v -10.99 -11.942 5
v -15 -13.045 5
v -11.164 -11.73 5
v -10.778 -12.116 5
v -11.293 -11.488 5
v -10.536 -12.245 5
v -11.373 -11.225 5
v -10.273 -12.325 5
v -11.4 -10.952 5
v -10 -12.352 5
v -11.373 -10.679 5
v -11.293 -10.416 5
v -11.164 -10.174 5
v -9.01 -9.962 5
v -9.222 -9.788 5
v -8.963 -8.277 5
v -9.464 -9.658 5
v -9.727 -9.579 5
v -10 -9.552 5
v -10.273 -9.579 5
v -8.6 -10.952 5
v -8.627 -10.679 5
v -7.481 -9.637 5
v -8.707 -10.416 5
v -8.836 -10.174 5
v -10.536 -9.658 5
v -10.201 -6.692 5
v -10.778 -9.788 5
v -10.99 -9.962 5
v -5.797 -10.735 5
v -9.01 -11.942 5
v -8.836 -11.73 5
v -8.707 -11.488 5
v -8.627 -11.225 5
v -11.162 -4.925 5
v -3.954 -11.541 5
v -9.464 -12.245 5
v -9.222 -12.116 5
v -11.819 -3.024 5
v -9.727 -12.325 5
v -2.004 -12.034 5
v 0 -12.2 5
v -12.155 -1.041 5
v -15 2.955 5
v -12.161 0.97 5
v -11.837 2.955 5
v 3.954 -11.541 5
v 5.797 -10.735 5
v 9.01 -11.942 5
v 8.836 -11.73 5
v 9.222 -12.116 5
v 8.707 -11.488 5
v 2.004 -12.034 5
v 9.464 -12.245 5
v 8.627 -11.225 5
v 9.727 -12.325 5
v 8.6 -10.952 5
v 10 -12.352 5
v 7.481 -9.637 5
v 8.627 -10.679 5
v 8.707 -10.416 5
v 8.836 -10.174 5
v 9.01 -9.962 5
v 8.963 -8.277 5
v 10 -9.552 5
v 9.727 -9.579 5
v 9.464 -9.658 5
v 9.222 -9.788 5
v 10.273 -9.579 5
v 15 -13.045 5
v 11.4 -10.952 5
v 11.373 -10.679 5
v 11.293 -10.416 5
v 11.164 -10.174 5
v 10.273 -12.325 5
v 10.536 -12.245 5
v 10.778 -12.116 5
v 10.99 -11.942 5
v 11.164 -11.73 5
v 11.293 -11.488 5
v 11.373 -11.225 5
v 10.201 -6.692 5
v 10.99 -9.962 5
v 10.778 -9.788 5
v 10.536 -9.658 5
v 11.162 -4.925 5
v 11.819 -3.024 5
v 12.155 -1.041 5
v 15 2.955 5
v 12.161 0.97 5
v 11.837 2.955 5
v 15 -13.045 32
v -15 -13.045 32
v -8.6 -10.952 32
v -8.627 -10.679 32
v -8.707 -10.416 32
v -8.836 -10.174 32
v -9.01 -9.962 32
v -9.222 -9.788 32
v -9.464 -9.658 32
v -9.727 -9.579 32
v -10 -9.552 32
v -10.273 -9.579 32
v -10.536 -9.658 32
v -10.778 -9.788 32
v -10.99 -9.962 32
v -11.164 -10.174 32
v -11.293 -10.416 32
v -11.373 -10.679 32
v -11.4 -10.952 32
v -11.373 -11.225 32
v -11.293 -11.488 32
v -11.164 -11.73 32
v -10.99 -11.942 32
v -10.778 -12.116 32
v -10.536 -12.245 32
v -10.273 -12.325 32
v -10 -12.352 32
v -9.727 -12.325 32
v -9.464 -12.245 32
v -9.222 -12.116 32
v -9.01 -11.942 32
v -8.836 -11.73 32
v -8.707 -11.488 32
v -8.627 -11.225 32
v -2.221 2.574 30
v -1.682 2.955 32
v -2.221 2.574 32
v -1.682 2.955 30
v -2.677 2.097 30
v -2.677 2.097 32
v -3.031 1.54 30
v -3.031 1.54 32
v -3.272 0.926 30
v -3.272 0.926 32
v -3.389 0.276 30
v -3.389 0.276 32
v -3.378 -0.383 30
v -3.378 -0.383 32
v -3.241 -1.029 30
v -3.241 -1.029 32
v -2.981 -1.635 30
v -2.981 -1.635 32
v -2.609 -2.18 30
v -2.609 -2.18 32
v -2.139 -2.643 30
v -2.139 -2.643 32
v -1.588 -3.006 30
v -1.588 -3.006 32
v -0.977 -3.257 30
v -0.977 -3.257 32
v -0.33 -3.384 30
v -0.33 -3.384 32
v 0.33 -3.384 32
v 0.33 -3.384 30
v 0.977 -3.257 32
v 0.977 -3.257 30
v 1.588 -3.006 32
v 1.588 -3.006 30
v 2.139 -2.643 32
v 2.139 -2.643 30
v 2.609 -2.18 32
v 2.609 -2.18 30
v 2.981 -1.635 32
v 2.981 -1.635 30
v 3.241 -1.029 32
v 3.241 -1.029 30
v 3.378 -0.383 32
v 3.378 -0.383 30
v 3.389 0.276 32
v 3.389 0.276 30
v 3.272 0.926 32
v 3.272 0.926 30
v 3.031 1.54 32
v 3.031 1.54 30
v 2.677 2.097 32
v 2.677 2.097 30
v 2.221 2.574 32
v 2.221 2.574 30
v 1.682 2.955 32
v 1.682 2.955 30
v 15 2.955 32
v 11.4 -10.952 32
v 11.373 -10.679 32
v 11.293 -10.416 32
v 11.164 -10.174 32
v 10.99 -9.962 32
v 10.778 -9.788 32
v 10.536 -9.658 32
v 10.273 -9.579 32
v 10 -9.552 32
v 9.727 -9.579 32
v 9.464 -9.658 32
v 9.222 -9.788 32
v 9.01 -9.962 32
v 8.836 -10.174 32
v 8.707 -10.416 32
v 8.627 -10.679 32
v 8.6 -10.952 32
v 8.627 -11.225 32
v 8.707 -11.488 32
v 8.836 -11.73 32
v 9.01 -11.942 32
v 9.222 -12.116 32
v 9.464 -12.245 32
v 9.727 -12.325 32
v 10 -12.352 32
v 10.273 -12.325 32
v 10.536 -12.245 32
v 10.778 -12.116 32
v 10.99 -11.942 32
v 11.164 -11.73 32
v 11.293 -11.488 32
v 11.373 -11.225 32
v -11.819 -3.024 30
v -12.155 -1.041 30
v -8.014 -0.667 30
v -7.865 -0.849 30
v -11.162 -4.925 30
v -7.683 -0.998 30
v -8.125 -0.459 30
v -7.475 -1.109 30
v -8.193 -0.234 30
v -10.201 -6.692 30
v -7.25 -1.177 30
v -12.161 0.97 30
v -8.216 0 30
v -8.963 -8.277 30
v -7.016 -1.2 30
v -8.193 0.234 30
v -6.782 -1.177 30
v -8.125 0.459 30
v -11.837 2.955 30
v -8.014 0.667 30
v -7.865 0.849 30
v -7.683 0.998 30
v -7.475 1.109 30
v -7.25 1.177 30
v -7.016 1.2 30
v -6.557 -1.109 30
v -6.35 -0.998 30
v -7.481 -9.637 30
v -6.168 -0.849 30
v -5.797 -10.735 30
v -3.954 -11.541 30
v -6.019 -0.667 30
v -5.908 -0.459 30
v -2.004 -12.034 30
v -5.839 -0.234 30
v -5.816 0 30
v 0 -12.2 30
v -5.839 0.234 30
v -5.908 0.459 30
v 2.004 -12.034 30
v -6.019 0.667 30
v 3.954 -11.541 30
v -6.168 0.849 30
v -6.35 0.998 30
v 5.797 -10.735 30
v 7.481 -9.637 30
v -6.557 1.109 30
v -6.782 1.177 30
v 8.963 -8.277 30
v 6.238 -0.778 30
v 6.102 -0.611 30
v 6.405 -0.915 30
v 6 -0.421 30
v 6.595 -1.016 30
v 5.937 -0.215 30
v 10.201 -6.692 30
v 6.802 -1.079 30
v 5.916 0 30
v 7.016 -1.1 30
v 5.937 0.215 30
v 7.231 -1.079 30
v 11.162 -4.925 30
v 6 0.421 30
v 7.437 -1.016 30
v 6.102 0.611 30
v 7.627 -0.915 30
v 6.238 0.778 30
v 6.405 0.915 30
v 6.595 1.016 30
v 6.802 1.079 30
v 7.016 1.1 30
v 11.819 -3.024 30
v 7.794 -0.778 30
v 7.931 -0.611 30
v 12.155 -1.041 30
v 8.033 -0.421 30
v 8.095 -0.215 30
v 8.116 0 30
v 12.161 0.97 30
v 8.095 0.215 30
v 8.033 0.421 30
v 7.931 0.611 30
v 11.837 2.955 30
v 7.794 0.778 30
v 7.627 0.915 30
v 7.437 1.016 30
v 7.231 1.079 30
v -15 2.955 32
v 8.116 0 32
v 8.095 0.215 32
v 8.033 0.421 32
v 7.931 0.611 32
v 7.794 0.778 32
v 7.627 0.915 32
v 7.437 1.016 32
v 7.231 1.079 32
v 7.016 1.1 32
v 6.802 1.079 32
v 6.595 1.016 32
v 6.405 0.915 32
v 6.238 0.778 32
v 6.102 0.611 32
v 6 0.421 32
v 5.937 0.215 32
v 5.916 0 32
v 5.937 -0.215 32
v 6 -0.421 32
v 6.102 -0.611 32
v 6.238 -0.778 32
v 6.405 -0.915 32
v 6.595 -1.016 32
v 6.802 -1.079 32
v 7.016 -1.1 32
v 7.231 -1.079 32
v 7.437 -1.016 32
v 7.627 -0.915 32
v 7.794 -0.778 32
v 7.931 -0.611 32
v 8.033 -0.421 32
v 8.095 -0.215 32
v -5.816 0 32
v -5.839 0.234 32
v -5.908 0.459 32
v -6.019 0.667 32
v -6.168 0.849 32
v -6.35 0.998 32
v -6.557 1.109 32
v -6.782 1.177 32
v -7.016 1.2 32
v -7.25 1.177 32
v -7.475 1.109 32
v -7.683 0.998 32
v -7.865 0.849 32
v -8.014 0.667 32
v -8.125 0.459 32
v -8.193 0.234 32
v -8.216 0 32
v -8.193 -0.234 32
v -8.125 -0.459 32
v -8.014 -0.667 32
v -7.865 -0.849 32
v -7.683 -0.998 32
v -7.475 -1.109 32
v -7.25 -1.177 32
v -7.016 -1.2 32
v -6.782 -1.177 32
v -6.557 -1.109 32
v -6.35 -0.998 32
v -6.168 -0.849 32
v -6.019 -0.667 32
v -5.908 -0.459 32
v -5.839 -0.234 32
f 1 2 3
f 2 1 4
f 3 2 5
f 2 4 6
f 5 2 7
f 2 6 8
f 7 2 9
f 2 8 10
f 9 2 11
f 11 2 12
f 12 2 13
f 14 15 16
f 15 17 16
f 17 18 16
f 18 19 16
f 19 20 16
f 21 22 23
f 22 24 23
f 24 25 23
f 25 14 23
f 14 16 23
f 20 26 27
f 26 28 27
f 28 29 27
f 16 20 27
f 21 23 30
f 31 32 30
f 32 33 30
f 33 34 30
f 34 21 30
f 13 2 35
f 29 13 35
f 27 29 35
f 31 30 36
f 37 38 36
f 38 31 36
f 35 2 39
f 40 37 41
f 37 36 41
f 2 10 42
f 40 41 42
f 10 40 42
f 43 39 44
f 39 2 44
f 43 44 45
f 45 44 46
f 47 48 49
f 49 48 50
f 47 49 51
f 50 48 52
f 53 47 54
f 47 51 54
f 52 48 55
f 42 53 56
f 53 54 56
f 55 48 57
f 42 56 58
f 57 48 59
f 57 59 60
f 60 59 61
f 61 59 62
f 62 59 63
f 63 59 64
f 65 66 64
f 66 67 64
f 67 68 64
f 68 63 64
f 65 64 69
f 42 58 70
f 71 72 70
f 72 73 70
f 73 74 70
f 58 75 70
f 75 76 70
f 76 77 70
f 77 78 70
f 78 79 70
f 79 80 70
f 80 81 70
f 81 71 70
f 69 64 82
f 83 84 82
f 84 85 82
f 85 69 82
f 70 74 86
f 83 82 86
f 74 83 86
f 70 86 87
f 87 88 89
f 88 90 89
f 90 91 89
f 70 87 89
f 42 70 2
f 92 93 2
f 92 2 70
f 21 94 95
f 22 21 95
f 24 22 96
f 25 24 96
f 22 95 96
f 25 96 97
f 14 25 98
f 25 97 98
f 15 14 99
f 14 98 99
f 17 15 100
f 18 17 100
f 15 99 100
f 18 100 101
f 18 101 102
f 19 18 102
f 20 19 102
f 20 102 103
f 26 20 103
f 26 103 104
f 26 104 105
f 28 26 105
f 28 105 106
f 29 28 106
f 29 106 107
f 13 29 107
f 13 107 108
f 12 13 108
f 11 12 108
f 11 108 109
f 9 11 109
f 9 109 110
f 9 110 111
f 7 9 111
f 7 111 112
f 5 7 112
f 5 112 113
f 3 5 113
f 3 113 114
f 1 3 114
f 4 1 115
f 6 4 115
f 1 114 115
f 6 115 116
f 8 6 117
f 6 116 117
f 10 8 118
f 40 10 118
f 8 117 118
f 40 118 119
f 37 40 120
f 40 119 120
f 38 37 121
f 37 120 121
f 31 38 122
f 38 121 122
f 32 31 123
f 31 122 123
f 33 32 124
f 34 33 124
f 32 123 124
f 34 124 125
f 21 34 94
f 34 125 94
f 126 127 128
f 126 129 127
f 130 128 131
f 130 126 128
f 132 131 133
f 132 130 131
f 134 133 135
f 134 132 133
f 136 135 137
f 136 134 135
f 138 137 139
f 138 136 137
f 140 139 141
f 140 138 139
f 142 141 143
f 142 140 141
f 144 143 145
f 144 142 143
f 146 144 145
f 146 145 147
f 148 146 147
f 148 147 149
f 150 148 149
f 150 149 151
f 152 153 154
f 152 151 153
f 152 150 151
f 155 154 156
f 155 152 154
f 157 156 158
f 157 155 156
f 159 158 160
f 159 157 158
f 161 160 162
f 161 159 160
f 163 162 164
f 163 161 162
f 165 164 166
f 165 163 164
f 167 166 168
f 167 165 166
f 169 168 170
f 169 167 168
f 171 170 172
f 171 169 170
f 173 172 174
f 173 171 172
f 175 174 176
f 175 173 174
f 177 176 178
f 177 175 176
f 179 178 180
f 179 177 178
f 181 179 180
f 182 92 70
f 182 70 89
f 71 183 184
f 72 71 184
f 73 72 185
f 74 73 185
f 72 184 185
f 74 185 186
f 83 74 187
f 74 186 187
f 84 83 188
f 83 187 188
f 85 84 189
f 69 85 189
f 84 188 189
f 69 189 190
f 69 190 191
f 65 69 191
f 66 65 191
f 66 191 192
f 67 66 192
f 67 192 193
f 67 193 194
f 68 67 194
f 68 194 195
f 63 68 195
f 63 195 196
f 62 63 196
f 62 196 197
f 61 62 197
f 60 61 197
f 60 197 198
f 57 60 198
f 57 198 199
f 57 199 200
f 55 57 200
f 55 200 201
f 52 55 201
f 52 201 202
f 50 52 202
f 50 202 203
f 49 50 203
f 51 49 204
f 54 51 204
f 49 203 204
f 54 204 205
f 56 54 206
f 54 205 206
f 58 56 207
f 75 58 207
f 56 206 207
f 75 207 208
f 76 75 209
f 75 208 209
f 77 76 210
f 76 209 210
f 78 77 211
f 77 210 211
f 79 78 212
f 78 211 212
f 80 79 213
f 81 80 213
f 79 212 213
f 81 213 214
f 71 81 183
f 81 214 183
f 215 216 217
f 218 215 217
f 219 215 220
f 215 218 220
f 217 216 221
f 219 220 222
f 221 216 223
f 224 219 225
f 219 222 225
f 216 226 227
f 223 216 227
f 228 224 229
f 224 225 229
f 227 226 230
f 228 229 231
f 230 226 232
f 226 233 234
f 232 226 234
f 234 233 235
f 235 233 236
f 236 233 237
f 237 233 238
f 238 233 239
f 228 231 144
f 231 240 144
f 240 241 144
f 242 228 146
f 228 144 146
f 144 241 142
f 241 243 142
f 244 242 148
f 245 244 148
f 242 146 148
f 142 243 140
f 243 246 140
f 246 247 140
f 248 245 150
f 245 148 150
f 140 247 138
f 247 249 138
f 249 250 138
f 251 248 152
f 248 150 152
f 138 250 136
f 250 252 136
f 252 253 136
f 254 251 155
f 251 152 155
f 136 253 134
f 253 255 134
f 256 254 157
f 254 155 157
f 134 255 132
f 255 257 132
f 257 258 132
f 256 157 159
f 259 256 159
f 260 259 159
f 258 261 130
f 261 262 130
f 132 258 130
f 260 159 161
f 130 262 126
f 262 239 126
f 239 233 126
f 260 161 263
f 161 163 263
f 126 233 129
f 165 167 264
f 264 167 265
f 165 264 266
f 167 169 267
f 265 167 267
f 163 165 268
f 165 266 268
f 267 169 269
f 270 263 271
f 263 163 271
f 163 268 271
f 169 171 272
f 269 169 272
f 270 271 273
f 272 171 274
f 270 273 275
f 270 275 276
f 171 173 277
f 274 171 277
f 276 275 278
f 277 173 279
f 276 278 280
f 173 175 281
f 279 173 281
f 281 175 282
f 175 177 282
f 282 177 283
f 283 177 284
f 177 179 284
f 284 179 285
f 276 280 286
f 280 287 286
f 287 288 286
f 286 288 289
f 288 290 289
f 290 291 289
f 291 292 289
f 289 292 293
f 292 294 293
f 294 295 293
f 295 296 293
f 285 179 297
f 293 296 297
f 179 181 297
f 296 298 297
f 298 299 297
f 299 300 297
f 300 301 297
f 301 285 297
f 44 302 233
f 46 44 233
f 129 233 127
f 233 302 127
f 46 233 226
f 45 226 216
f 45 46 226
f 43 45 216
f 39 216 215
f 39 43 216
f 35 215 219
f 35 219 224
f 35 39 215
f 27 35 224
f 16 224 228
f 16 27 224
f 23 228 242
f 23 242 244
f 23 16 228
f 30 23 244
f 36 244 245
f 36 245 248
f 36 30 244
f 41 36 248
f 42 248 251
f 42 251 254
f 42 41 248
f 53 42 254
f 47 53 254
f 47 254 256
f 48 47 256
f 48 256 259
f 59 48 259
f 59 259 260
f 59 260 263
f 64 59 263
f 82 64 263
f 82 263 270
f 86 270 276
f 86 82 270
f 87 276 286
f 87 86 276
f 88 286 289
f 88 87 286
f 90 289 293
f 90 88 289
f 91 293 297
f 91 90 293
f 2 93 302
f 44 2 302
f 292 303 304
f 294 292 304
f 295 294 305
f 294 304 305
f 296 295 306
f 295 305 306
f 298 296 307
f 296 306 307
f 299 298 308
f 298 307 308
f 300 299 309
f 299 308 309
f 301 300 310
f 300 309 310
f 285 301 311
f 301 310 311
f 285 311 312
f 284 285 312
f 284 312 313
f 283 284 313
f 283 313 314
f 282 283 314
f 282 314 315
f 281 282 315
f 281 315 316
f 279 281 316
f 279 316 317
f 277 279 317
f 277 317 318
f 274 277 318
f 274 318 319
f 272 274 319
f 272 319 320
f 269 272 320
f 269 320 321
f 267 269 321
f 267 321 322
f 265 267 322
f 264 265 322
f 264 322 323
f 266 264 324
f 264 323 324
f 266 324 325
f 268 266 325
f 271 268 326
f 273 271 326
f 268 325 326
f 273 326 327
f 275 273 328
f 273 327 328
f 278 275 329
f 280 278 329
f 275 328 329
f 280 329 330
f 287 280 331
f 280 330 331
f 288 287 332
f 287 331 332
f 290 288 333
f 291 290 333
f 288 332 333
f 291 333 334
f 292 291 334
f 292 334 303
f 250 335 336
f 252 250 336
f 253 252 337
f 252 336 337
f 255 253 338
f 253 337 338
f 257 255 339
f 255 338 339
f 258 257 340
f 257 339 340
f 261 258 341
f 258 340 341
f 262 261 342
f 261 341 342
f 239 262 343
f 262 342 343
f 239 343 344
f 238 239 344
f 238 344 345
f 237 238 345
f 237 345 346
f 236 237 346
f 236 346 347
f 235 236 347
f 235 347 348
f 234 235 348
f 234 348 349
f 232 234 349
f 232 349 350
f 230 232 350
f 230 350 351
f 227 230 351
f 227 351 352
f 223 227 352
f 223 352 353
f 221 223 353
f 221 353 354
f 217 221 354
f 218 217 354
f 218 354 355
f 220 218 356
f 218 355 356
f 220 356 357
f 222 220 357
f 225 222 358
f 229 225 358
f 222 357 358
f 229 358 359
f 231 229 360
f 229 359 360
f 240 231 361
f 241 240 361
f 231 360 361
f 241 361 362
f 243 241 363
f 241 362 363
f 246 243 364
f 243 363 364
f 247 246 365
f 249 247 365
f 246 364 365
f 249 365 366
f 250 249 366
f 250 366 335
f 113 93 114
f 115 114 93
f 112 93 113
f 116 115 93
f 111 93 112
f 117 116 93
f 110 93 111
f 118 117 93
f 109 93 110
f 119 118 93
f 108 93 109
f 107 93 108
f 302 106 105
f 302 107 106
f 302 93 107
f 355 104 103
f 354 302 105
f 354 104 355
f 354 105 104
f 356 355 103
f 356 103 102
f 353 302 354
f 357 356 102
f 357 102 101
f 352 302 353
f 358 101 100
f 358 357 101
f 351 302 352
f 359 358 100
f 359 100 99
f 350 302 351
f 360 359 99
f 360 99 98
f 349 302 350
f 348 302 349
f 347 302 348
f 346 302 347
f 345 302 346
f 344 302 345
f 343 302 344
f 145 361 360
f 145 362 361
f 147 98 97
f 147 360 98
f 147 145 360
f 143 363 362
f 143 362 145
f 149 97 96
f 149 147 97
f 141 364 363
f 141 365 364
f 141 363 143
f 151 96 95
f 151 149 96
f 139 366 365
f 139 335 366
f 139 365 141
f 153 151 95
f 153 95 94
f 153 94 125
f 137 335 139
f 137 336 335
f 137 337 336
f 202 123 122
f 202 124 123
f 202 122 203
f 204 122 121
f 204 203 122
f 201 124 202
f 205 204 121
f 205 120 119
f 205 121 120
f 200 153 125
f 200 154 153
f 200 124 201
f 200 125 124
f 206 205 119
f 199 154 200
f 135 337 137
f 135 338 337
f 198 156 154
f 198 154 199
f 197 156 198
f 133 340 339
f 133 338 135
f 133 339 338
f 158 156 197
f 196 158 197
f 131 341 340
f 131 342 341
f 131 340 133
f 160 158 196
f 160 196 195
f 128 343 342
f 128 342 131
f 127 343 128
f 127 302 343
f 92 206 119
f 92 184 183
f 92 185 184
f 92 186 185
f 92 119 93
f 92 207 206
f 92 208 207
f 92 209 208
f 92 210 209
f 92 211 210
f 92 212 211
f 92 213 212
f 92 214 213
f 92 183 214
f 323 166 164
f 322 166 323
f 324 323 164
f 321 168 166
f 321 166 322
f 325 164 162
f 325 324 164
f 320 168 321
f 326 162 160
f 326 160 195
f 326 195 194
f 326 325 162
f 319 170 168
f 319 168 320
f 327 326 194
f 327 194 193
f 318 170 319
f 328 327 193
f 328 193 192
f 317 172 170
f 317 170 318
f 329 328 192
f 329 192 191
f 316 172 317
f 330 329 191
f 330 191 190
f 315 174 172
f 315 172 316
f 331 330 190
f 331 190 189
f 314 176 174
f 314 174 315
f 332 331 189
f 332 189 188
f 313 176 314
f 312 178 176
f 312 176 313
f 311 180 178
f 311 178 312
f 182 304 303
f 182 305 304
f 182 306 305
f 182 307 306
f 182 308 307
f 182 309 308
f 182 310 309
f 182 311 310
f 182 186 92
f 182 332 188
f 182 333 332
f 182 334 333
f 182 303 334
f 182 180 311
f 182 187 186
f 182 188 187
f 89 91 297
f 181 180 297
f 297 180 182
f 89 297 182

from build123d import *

# Parameters (mm, degrees)
SKETCH004_W     = 30
SKETCH004_H     = 16
PAD003_DEPTH    = 2
SKETCH005_R     = 3.4
POCKET001_DEPTH = 20
PAD004_DEPTH    = 25
SKETCH006_R     = 12.2
POCKET002_DEPTH = 30
SKETCH007_R     = 1.2
SKETCH007_R_2   = 1.1
POCKET003_DEPTH = 5
SKETCH008_R     = 1.4
POCKET004_DEPTH = 50


with BuildPart() as part:
    # Sketch004 → Pad003 (new body)
    with BuildSketch(Plane.XY.offset(30)):
        with Locations((0, -5.045388)):
            Rectangle(SKETCH004_W, SKETCH004_H)
    extrude(amount=PAD003_DEPTH)

    # Sketch005 (on Face3 of Pad) → Pocket001 (cut)
    with BuildSketch(Plane.XY.offset(30)):
        Circle(SKETCH005_R)
    extrude(amount=POCKET001_DEPTH, mode=Mode.SUBTRACT)

    # Sketch004 → Pad004 (join)
    with BuildSketch(Plane.XY.offset(30)):
        with Locations((0, -5.045388)):
            Rectangle(SKETCH004_W, SKETCH004_H)
    extrude(amount=-PAD004_DEPTH)

    # Sketch006 → Pocket002 (cut)
    with BuildSketch(Plane.XY):
        Circle(SKETCH006_R)
    extrude(amount=POCKET002_DEPTH, mode=Mode.SUBTRACT)

    # Sketch007 (on Face5 of Pocket002) → Pocket003 (cut)
    with BuildSketch(Plane.XY.offset(32)):
        with Locations((-7.016269, 0)):
            Circle(SKETCH007_R)
        with Locations((7.016269, 0)):
            Circle(SKETCH007_R_2)
    extrude(amount=-POCKET003_DEPTH, mode=Mode.SUBTRACT)

    # Sketch008 (on Face5 of Pocket003) → Pocket004 (cut)
    with BuildSketch(Plane.XY.offset(32)):
        with Locations((-10, -10.95175)):
            Circle(SKETCH008_R)
        with Locations((10, -10.95175)):
            Circle(SKETCH008_R)
    extrude(amount=-POCKET004_DEPTH, mode=Mode.SUBTRACT)


solid = part.part
